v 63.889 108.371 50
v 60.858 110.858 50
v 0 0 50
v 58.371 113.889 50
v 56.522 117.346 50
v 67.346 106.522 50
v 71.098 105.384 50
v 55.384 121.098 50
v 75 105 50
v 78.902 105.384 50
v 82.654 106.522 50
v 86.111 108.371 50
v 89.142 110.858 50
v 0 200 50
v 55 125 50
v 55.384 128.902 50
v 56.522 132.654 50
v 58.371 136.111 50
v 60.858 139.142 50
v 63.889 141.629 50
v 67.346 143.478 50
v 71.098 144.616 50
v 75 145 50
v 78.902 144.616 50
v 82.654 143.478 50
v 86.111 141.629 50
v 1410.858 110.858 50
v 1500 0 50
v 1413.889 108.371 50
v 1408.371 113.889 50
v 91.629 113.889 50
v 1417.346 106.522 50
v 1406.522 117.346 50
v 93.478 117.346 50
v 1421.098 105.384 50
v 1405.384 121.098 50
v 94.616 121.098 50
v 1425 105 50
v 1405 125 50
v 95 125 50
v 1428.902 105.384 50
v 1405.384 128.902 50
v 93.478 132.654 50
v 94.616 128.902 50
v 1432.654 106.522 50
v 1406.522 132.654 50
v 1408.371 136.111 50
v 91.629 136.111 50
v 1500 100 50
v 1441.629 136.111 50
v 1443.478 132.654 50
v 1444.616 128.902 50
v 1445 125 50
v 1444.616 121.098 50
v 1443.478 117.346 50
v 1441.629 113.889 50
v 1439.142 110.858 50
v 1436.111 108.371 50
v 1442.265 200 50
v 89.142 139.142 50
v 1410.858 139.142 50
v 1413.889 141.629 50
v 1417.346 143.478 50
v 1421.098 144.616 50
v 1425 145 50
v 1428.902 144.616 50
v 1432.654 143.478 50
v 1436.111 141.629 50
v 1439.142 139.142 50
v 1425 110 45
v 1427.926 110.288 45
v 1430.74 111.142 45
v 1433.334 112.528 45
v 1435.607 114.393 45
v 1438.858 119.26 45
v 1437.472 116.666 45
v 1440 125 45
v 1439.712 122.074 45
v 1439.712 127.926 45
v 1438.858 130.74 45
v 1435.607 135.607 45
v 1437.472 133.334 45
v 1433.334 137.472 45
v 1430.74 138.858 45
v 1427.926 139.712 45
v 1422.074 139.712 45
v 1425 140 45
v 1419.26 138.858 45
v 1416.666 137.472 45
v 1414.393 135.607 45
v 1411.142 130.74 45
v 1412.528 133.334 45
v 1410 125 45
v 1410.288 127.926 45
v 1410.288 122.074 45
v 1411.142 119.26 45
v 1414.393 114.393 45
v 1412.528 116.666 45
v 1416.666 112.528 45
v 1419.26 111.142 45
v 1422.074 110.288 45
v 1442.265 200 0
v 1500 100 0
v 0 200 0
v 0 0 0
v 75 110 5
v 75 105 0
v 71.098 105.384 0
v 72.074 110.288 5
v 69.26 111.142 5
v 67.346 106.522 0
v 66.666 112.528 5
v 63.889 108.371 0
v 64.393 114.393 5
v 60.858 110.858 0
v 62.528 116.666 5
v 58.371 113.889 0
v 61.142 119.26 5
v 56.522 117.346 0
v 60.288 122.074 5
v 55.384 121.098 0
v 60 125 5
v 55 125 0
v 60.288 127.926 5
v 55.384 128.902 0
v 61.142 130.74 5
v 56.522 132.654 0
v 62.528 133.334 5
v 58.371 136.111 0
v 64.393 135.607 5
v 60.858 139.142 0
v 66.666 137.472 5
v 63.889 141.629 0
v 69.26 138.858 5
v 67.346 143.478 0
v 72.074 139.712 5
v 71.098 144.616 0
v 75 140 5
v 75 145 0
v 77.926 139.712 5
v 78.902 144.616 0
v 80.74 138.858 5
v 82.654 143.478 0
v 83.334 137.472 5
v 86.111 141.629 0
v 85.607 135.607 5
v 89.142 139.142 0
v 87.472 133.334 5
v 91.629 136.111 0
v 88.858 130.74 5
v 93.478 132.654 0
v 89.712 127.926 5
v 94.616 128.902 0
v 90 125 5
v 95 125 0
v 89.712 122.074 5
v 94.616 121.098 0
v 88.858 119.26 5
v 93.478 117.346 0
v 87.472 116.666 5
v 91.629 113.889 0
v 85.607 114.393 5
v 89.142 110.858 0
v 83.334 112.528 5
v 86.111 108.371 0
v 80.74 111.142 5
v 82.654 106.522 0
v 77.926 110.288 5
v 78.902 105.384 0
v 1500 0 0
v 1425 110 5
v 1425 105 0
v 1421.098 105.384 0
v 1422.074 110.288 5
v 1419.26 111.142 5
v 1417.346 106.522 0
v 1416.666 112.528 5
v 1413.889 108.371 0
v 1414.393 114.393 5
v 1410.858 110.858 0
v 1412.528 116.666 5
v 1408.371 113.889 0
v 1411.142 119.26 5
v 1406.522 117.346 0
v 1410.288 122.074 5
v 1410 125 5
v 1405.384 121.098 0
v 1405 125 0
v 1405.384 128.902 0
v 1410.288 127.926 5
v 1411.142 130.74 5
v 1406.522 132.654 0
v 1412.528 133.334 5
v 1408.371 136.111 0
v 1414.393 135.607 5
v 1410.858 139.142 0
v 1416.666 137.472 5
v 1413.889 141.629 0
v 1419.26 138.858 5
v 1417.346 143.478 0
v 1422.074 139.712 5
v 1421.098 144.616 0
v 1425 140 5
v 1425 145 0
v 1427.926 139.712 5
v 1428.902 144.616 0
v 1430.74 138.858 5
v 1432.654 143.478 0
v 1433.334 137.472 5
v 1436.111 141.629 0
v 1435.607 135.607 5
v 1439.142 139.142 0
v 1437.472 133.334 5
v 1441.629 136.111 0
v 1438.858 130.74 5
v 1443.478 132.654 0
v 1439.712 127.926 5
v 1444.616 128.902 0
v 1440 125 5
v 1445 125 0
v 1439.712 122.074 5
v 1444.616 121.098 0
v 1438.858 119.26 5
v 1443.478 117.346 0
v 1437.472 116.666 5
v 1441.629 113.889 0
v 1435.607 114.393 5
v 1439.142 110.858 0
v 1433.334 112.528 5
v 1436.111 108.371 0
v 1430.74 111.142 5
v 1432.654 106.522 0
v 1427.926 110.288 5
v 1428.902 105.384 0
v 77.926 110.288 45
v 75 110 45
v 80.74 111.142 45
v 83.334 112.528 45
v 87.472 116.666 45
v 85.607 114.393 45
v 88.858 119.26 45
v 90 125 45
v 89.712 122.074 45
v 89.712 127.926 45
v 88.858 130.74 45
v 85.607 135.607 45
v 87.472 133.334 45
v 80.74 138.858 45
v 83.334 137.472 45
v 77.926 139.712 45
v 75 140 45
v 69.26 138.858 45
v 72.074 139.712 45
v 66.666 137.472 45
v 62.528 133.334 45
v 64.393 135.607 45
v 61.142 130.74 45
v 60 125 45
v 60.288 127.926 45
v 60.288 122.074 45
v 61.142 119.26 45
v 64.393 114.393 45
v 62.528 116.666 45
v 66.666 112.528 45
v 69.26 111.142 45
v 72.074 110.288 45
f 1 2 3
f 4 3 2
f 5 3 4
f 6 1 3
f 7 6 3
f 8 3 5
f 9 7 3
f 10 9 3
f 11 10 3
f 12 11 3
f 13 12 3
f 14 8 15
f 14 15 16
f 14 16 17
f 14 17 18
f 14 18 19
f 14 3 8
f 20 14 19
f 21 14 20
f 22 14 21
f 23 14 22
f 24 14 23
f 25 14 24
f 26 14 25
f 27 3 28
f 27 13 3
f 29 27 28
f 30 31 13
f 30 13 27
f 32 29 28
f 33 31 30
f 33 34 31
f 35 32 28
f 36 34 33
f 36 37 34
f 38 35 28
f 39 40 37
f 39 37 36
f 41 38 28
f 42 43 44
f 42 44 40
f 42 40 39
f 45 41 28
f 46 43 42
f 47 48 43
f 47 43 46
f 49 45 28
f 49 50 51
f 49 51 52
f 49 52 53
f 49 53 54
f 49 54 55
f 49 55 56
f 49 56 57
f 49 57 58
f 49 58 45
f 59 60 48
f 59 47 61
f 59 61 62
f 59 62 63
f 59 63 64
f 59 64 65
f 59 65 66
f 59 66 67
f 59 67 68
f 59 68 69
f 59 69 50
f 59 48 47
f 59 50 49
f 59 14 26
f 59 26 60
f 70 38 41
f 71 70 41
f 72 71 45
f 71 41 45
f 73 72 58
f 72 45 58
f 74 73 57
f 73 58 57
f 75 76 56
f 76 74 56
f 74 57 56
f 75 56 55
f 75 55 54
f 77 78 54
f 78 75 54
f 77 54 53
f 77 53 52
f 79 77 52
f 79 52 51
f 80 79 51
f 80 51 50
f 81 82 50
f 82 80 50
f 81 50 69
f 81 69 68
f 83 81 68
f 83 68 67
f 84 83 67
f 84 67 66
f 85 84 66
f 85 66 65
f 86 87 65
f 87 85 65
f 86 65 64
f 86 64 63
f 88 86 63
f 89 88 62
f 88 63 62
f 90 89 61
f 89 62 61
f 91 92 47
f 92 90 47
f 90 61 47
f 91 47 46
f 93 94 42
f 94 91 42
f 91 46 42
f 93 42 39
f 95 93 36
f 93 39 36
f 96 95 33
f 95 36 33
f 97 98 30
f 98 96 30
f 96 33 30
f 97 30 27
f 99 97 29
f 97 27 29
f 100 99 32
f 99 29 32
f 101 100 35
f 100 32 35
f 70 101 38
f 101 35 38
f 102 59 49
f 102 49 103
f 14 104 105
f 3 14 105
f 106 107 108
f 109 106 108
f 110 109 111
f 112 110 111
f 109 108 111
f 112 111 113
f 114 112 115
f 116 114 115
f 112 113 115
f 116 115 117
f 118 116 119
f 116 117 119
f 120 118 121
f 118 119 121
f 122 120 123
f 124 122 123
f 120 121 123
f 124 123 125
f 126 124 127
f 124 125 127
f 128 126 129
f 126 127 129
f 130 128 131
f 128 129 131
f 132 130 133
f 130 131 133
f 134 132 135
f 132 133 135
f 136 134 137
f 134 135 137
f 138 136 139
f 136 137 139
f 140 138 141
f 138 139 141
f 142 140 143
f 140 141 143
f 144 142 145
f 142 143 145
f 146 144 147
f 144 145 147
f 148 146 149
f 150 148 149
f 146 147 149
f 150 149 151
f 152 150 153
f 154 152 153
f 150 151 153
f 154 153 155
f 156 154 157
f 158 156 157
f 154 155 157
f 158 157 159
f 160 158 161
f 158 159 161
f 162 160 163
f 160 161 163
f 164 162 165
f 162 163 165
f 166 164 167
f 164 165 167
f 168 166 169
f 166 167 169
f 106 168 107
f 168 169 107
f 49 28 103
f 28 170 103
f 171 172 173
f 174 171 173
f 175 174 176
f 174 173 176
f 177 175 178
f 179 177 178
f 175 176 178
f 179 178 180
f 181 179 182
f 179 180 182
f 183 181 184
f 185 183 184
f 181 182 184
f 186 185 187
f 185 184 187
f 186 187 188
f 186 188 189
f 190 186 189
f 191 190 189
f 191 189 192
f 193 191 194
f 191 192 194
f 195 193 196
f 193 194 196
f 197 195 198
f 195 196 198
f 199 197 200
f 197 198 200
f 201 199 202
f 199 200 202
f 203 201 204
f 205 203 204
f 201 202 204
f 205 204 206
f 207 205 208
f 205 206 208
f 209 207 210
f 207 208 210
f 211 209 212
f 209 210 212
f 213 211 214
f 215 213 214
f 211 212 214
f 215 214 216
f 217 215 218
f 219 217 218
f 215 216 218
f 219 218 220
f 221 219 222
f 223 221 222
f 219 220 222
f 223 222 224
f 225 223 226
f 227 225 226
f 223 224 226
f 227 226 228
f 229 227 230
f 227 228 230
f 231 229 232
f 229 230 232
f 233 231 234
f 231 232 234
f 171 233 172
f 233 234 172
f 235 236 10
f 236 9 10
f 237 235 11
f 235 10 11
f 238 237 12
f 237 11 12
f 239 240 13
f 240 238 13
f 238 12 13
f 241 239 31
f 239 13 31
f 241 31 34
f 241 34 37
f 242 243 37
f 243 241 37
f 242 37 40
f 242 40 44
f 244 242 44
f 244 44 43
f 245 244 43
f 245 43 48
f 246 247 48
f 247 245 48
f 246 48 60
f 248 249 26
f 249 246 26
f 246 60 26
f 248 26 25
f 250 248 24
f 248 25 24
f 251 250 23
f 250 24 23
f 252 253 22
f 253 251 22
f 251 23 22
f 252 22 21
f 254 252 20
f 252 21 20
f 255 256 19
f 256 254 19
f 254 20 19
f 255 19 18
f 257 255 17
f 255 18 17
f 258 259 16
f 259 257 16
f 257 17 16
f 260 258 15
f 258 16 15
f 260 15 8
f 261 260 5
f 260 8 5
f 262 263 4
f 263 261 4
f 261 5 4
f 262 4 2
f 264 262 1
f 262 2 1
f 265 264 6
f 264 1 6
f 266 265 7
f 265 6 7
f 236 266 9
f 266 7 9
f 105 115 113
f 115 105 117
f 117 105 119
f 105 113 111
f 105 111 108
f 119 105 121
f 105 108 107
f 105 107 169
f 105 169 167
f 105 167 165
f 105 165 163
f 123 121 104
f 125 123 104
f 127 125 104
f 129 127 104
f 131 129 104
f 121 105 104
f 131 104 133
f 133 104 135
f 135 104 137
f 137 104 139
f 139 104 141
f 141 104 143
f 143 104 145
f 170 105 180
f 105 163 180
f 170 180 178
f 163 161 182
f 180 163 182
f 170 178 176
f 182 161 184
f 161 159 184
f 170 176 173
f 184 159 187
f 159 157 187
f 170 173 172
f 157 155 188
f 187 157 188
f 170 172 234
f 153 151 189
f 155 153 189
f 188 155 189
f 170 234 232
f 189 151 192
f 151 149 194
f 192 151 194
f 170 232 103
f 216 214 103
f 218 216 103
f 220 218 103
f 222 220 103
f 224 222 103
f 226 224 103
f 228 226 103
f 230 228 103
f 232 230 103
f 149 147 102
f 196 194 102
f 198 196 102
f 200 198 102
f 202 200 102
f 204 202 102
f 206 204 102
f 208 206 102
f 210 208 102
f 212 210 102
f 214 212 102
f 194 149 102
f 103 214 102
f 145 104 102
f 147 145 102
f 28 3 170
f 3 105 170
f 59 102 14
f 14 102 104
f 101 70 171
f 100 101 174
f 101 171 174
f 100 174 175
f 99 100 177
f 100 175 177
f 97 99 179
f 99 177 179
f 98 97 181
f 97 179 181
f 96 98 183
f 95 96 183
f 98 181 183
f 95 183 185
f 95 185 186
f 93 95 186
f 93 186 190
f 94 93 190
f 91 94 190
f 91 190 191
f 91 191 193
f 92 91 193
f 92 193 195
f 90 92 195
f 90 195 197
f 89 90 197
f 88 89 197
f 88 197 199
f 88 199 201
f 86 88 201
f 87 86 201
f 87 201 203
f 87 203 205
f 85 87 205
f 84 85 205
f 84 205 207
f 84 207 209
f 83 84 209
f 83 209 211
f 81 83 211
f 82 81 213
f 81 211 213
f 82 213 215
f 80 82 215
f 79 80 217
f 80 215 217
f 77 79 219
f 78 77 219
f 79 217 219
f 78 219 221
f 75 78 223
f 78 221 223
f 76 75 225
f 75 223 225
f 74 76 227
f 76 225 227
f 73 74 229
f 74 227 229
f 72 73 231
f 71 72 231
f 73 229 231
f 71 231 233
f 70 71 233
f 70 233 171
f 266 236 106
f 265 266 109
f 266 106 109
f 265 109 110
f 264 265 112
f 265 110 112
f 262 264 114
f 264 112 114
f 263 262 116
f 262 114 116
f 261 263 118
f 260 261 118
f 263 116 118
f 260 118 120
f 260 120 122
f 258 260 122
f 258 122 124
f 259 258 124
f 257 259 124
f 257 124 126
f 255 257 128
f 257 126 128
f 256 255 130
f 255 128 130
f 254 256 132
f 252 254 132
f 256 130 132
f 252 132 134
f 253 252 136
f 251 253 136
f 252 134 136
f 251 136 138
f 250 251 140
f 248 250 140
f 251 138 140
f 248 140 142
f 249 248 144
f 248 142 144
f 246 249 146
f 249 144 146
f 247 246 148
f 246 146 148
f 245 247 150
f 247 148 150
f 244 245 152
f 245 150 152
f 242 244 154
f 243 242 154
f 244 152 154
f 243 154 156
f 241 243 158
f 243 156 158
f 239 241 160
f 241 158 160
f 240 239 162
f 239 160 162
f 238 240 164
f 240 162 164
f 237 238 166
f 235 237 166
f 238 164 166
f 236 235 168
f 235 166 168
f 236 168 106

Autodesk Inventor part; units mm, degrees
ref_plane "YZ Plane" through (0, 0, 0) normal (1, 0, 0) x (0, 1, 0)
ref_plane "XZ Plane" through (0, 0, 0) normal (0, 1, 0) x (-1, 0, 0)
ref_plane "XY Plane" through (0, 0, 0) normal (0, 0, 1) x (1, 0, 0)
sketch "Sketch1" plane through (0, 0, 0) normal (0, 0, 1) x (1, 0, 0)
  line L0 (0, 0) -> (1500, 0)
  line L1 (1500, 0) -> (1500, 200)
  line L2 (1500, 200) -> (0, 200)
  line L3 (0, 200) -> (0, 0)
  dimension "d0" = 200
  dimension "d1" = 1500
extrude "Extrusion1" add sketch "Sketch1" along normal blind 50
sketch "Sketch2" plane through (0, 0, 50) normal (0, 0, 1) x (1, 0, 0)
  line L0 (0, 200) -> (0, 0) projected
  line L1 (1500, 0) -> (1500, 200) projected
  line L2 (1500, 200) -> (0, 200) projected
  point P0 (75, 125)
  point P1 (1425, 125)
  point P2 (0, 100)
  dimension "d4" = 75
  dimension "d5" = 75
  dimension "d19" = 75
hole "Hole1" at (75, 125, 50) at (1425, 125, 50) direction (0, 0, -1) diameter 30 end through all
chamfer "Chamfer1" distance 5 angle 45 4 edges at (75, 140, 50) (1425, 140, 50) (75, 140, 0) (1425, 140, 0)
chamfer "Chamfer2" distance 100 angle 30 1 edges at (1500, 200, 25) measured on face at (1500, 66.6667, 16.6667)
properties part number "Top_Floor Plank" material "Wood (Birch)"
